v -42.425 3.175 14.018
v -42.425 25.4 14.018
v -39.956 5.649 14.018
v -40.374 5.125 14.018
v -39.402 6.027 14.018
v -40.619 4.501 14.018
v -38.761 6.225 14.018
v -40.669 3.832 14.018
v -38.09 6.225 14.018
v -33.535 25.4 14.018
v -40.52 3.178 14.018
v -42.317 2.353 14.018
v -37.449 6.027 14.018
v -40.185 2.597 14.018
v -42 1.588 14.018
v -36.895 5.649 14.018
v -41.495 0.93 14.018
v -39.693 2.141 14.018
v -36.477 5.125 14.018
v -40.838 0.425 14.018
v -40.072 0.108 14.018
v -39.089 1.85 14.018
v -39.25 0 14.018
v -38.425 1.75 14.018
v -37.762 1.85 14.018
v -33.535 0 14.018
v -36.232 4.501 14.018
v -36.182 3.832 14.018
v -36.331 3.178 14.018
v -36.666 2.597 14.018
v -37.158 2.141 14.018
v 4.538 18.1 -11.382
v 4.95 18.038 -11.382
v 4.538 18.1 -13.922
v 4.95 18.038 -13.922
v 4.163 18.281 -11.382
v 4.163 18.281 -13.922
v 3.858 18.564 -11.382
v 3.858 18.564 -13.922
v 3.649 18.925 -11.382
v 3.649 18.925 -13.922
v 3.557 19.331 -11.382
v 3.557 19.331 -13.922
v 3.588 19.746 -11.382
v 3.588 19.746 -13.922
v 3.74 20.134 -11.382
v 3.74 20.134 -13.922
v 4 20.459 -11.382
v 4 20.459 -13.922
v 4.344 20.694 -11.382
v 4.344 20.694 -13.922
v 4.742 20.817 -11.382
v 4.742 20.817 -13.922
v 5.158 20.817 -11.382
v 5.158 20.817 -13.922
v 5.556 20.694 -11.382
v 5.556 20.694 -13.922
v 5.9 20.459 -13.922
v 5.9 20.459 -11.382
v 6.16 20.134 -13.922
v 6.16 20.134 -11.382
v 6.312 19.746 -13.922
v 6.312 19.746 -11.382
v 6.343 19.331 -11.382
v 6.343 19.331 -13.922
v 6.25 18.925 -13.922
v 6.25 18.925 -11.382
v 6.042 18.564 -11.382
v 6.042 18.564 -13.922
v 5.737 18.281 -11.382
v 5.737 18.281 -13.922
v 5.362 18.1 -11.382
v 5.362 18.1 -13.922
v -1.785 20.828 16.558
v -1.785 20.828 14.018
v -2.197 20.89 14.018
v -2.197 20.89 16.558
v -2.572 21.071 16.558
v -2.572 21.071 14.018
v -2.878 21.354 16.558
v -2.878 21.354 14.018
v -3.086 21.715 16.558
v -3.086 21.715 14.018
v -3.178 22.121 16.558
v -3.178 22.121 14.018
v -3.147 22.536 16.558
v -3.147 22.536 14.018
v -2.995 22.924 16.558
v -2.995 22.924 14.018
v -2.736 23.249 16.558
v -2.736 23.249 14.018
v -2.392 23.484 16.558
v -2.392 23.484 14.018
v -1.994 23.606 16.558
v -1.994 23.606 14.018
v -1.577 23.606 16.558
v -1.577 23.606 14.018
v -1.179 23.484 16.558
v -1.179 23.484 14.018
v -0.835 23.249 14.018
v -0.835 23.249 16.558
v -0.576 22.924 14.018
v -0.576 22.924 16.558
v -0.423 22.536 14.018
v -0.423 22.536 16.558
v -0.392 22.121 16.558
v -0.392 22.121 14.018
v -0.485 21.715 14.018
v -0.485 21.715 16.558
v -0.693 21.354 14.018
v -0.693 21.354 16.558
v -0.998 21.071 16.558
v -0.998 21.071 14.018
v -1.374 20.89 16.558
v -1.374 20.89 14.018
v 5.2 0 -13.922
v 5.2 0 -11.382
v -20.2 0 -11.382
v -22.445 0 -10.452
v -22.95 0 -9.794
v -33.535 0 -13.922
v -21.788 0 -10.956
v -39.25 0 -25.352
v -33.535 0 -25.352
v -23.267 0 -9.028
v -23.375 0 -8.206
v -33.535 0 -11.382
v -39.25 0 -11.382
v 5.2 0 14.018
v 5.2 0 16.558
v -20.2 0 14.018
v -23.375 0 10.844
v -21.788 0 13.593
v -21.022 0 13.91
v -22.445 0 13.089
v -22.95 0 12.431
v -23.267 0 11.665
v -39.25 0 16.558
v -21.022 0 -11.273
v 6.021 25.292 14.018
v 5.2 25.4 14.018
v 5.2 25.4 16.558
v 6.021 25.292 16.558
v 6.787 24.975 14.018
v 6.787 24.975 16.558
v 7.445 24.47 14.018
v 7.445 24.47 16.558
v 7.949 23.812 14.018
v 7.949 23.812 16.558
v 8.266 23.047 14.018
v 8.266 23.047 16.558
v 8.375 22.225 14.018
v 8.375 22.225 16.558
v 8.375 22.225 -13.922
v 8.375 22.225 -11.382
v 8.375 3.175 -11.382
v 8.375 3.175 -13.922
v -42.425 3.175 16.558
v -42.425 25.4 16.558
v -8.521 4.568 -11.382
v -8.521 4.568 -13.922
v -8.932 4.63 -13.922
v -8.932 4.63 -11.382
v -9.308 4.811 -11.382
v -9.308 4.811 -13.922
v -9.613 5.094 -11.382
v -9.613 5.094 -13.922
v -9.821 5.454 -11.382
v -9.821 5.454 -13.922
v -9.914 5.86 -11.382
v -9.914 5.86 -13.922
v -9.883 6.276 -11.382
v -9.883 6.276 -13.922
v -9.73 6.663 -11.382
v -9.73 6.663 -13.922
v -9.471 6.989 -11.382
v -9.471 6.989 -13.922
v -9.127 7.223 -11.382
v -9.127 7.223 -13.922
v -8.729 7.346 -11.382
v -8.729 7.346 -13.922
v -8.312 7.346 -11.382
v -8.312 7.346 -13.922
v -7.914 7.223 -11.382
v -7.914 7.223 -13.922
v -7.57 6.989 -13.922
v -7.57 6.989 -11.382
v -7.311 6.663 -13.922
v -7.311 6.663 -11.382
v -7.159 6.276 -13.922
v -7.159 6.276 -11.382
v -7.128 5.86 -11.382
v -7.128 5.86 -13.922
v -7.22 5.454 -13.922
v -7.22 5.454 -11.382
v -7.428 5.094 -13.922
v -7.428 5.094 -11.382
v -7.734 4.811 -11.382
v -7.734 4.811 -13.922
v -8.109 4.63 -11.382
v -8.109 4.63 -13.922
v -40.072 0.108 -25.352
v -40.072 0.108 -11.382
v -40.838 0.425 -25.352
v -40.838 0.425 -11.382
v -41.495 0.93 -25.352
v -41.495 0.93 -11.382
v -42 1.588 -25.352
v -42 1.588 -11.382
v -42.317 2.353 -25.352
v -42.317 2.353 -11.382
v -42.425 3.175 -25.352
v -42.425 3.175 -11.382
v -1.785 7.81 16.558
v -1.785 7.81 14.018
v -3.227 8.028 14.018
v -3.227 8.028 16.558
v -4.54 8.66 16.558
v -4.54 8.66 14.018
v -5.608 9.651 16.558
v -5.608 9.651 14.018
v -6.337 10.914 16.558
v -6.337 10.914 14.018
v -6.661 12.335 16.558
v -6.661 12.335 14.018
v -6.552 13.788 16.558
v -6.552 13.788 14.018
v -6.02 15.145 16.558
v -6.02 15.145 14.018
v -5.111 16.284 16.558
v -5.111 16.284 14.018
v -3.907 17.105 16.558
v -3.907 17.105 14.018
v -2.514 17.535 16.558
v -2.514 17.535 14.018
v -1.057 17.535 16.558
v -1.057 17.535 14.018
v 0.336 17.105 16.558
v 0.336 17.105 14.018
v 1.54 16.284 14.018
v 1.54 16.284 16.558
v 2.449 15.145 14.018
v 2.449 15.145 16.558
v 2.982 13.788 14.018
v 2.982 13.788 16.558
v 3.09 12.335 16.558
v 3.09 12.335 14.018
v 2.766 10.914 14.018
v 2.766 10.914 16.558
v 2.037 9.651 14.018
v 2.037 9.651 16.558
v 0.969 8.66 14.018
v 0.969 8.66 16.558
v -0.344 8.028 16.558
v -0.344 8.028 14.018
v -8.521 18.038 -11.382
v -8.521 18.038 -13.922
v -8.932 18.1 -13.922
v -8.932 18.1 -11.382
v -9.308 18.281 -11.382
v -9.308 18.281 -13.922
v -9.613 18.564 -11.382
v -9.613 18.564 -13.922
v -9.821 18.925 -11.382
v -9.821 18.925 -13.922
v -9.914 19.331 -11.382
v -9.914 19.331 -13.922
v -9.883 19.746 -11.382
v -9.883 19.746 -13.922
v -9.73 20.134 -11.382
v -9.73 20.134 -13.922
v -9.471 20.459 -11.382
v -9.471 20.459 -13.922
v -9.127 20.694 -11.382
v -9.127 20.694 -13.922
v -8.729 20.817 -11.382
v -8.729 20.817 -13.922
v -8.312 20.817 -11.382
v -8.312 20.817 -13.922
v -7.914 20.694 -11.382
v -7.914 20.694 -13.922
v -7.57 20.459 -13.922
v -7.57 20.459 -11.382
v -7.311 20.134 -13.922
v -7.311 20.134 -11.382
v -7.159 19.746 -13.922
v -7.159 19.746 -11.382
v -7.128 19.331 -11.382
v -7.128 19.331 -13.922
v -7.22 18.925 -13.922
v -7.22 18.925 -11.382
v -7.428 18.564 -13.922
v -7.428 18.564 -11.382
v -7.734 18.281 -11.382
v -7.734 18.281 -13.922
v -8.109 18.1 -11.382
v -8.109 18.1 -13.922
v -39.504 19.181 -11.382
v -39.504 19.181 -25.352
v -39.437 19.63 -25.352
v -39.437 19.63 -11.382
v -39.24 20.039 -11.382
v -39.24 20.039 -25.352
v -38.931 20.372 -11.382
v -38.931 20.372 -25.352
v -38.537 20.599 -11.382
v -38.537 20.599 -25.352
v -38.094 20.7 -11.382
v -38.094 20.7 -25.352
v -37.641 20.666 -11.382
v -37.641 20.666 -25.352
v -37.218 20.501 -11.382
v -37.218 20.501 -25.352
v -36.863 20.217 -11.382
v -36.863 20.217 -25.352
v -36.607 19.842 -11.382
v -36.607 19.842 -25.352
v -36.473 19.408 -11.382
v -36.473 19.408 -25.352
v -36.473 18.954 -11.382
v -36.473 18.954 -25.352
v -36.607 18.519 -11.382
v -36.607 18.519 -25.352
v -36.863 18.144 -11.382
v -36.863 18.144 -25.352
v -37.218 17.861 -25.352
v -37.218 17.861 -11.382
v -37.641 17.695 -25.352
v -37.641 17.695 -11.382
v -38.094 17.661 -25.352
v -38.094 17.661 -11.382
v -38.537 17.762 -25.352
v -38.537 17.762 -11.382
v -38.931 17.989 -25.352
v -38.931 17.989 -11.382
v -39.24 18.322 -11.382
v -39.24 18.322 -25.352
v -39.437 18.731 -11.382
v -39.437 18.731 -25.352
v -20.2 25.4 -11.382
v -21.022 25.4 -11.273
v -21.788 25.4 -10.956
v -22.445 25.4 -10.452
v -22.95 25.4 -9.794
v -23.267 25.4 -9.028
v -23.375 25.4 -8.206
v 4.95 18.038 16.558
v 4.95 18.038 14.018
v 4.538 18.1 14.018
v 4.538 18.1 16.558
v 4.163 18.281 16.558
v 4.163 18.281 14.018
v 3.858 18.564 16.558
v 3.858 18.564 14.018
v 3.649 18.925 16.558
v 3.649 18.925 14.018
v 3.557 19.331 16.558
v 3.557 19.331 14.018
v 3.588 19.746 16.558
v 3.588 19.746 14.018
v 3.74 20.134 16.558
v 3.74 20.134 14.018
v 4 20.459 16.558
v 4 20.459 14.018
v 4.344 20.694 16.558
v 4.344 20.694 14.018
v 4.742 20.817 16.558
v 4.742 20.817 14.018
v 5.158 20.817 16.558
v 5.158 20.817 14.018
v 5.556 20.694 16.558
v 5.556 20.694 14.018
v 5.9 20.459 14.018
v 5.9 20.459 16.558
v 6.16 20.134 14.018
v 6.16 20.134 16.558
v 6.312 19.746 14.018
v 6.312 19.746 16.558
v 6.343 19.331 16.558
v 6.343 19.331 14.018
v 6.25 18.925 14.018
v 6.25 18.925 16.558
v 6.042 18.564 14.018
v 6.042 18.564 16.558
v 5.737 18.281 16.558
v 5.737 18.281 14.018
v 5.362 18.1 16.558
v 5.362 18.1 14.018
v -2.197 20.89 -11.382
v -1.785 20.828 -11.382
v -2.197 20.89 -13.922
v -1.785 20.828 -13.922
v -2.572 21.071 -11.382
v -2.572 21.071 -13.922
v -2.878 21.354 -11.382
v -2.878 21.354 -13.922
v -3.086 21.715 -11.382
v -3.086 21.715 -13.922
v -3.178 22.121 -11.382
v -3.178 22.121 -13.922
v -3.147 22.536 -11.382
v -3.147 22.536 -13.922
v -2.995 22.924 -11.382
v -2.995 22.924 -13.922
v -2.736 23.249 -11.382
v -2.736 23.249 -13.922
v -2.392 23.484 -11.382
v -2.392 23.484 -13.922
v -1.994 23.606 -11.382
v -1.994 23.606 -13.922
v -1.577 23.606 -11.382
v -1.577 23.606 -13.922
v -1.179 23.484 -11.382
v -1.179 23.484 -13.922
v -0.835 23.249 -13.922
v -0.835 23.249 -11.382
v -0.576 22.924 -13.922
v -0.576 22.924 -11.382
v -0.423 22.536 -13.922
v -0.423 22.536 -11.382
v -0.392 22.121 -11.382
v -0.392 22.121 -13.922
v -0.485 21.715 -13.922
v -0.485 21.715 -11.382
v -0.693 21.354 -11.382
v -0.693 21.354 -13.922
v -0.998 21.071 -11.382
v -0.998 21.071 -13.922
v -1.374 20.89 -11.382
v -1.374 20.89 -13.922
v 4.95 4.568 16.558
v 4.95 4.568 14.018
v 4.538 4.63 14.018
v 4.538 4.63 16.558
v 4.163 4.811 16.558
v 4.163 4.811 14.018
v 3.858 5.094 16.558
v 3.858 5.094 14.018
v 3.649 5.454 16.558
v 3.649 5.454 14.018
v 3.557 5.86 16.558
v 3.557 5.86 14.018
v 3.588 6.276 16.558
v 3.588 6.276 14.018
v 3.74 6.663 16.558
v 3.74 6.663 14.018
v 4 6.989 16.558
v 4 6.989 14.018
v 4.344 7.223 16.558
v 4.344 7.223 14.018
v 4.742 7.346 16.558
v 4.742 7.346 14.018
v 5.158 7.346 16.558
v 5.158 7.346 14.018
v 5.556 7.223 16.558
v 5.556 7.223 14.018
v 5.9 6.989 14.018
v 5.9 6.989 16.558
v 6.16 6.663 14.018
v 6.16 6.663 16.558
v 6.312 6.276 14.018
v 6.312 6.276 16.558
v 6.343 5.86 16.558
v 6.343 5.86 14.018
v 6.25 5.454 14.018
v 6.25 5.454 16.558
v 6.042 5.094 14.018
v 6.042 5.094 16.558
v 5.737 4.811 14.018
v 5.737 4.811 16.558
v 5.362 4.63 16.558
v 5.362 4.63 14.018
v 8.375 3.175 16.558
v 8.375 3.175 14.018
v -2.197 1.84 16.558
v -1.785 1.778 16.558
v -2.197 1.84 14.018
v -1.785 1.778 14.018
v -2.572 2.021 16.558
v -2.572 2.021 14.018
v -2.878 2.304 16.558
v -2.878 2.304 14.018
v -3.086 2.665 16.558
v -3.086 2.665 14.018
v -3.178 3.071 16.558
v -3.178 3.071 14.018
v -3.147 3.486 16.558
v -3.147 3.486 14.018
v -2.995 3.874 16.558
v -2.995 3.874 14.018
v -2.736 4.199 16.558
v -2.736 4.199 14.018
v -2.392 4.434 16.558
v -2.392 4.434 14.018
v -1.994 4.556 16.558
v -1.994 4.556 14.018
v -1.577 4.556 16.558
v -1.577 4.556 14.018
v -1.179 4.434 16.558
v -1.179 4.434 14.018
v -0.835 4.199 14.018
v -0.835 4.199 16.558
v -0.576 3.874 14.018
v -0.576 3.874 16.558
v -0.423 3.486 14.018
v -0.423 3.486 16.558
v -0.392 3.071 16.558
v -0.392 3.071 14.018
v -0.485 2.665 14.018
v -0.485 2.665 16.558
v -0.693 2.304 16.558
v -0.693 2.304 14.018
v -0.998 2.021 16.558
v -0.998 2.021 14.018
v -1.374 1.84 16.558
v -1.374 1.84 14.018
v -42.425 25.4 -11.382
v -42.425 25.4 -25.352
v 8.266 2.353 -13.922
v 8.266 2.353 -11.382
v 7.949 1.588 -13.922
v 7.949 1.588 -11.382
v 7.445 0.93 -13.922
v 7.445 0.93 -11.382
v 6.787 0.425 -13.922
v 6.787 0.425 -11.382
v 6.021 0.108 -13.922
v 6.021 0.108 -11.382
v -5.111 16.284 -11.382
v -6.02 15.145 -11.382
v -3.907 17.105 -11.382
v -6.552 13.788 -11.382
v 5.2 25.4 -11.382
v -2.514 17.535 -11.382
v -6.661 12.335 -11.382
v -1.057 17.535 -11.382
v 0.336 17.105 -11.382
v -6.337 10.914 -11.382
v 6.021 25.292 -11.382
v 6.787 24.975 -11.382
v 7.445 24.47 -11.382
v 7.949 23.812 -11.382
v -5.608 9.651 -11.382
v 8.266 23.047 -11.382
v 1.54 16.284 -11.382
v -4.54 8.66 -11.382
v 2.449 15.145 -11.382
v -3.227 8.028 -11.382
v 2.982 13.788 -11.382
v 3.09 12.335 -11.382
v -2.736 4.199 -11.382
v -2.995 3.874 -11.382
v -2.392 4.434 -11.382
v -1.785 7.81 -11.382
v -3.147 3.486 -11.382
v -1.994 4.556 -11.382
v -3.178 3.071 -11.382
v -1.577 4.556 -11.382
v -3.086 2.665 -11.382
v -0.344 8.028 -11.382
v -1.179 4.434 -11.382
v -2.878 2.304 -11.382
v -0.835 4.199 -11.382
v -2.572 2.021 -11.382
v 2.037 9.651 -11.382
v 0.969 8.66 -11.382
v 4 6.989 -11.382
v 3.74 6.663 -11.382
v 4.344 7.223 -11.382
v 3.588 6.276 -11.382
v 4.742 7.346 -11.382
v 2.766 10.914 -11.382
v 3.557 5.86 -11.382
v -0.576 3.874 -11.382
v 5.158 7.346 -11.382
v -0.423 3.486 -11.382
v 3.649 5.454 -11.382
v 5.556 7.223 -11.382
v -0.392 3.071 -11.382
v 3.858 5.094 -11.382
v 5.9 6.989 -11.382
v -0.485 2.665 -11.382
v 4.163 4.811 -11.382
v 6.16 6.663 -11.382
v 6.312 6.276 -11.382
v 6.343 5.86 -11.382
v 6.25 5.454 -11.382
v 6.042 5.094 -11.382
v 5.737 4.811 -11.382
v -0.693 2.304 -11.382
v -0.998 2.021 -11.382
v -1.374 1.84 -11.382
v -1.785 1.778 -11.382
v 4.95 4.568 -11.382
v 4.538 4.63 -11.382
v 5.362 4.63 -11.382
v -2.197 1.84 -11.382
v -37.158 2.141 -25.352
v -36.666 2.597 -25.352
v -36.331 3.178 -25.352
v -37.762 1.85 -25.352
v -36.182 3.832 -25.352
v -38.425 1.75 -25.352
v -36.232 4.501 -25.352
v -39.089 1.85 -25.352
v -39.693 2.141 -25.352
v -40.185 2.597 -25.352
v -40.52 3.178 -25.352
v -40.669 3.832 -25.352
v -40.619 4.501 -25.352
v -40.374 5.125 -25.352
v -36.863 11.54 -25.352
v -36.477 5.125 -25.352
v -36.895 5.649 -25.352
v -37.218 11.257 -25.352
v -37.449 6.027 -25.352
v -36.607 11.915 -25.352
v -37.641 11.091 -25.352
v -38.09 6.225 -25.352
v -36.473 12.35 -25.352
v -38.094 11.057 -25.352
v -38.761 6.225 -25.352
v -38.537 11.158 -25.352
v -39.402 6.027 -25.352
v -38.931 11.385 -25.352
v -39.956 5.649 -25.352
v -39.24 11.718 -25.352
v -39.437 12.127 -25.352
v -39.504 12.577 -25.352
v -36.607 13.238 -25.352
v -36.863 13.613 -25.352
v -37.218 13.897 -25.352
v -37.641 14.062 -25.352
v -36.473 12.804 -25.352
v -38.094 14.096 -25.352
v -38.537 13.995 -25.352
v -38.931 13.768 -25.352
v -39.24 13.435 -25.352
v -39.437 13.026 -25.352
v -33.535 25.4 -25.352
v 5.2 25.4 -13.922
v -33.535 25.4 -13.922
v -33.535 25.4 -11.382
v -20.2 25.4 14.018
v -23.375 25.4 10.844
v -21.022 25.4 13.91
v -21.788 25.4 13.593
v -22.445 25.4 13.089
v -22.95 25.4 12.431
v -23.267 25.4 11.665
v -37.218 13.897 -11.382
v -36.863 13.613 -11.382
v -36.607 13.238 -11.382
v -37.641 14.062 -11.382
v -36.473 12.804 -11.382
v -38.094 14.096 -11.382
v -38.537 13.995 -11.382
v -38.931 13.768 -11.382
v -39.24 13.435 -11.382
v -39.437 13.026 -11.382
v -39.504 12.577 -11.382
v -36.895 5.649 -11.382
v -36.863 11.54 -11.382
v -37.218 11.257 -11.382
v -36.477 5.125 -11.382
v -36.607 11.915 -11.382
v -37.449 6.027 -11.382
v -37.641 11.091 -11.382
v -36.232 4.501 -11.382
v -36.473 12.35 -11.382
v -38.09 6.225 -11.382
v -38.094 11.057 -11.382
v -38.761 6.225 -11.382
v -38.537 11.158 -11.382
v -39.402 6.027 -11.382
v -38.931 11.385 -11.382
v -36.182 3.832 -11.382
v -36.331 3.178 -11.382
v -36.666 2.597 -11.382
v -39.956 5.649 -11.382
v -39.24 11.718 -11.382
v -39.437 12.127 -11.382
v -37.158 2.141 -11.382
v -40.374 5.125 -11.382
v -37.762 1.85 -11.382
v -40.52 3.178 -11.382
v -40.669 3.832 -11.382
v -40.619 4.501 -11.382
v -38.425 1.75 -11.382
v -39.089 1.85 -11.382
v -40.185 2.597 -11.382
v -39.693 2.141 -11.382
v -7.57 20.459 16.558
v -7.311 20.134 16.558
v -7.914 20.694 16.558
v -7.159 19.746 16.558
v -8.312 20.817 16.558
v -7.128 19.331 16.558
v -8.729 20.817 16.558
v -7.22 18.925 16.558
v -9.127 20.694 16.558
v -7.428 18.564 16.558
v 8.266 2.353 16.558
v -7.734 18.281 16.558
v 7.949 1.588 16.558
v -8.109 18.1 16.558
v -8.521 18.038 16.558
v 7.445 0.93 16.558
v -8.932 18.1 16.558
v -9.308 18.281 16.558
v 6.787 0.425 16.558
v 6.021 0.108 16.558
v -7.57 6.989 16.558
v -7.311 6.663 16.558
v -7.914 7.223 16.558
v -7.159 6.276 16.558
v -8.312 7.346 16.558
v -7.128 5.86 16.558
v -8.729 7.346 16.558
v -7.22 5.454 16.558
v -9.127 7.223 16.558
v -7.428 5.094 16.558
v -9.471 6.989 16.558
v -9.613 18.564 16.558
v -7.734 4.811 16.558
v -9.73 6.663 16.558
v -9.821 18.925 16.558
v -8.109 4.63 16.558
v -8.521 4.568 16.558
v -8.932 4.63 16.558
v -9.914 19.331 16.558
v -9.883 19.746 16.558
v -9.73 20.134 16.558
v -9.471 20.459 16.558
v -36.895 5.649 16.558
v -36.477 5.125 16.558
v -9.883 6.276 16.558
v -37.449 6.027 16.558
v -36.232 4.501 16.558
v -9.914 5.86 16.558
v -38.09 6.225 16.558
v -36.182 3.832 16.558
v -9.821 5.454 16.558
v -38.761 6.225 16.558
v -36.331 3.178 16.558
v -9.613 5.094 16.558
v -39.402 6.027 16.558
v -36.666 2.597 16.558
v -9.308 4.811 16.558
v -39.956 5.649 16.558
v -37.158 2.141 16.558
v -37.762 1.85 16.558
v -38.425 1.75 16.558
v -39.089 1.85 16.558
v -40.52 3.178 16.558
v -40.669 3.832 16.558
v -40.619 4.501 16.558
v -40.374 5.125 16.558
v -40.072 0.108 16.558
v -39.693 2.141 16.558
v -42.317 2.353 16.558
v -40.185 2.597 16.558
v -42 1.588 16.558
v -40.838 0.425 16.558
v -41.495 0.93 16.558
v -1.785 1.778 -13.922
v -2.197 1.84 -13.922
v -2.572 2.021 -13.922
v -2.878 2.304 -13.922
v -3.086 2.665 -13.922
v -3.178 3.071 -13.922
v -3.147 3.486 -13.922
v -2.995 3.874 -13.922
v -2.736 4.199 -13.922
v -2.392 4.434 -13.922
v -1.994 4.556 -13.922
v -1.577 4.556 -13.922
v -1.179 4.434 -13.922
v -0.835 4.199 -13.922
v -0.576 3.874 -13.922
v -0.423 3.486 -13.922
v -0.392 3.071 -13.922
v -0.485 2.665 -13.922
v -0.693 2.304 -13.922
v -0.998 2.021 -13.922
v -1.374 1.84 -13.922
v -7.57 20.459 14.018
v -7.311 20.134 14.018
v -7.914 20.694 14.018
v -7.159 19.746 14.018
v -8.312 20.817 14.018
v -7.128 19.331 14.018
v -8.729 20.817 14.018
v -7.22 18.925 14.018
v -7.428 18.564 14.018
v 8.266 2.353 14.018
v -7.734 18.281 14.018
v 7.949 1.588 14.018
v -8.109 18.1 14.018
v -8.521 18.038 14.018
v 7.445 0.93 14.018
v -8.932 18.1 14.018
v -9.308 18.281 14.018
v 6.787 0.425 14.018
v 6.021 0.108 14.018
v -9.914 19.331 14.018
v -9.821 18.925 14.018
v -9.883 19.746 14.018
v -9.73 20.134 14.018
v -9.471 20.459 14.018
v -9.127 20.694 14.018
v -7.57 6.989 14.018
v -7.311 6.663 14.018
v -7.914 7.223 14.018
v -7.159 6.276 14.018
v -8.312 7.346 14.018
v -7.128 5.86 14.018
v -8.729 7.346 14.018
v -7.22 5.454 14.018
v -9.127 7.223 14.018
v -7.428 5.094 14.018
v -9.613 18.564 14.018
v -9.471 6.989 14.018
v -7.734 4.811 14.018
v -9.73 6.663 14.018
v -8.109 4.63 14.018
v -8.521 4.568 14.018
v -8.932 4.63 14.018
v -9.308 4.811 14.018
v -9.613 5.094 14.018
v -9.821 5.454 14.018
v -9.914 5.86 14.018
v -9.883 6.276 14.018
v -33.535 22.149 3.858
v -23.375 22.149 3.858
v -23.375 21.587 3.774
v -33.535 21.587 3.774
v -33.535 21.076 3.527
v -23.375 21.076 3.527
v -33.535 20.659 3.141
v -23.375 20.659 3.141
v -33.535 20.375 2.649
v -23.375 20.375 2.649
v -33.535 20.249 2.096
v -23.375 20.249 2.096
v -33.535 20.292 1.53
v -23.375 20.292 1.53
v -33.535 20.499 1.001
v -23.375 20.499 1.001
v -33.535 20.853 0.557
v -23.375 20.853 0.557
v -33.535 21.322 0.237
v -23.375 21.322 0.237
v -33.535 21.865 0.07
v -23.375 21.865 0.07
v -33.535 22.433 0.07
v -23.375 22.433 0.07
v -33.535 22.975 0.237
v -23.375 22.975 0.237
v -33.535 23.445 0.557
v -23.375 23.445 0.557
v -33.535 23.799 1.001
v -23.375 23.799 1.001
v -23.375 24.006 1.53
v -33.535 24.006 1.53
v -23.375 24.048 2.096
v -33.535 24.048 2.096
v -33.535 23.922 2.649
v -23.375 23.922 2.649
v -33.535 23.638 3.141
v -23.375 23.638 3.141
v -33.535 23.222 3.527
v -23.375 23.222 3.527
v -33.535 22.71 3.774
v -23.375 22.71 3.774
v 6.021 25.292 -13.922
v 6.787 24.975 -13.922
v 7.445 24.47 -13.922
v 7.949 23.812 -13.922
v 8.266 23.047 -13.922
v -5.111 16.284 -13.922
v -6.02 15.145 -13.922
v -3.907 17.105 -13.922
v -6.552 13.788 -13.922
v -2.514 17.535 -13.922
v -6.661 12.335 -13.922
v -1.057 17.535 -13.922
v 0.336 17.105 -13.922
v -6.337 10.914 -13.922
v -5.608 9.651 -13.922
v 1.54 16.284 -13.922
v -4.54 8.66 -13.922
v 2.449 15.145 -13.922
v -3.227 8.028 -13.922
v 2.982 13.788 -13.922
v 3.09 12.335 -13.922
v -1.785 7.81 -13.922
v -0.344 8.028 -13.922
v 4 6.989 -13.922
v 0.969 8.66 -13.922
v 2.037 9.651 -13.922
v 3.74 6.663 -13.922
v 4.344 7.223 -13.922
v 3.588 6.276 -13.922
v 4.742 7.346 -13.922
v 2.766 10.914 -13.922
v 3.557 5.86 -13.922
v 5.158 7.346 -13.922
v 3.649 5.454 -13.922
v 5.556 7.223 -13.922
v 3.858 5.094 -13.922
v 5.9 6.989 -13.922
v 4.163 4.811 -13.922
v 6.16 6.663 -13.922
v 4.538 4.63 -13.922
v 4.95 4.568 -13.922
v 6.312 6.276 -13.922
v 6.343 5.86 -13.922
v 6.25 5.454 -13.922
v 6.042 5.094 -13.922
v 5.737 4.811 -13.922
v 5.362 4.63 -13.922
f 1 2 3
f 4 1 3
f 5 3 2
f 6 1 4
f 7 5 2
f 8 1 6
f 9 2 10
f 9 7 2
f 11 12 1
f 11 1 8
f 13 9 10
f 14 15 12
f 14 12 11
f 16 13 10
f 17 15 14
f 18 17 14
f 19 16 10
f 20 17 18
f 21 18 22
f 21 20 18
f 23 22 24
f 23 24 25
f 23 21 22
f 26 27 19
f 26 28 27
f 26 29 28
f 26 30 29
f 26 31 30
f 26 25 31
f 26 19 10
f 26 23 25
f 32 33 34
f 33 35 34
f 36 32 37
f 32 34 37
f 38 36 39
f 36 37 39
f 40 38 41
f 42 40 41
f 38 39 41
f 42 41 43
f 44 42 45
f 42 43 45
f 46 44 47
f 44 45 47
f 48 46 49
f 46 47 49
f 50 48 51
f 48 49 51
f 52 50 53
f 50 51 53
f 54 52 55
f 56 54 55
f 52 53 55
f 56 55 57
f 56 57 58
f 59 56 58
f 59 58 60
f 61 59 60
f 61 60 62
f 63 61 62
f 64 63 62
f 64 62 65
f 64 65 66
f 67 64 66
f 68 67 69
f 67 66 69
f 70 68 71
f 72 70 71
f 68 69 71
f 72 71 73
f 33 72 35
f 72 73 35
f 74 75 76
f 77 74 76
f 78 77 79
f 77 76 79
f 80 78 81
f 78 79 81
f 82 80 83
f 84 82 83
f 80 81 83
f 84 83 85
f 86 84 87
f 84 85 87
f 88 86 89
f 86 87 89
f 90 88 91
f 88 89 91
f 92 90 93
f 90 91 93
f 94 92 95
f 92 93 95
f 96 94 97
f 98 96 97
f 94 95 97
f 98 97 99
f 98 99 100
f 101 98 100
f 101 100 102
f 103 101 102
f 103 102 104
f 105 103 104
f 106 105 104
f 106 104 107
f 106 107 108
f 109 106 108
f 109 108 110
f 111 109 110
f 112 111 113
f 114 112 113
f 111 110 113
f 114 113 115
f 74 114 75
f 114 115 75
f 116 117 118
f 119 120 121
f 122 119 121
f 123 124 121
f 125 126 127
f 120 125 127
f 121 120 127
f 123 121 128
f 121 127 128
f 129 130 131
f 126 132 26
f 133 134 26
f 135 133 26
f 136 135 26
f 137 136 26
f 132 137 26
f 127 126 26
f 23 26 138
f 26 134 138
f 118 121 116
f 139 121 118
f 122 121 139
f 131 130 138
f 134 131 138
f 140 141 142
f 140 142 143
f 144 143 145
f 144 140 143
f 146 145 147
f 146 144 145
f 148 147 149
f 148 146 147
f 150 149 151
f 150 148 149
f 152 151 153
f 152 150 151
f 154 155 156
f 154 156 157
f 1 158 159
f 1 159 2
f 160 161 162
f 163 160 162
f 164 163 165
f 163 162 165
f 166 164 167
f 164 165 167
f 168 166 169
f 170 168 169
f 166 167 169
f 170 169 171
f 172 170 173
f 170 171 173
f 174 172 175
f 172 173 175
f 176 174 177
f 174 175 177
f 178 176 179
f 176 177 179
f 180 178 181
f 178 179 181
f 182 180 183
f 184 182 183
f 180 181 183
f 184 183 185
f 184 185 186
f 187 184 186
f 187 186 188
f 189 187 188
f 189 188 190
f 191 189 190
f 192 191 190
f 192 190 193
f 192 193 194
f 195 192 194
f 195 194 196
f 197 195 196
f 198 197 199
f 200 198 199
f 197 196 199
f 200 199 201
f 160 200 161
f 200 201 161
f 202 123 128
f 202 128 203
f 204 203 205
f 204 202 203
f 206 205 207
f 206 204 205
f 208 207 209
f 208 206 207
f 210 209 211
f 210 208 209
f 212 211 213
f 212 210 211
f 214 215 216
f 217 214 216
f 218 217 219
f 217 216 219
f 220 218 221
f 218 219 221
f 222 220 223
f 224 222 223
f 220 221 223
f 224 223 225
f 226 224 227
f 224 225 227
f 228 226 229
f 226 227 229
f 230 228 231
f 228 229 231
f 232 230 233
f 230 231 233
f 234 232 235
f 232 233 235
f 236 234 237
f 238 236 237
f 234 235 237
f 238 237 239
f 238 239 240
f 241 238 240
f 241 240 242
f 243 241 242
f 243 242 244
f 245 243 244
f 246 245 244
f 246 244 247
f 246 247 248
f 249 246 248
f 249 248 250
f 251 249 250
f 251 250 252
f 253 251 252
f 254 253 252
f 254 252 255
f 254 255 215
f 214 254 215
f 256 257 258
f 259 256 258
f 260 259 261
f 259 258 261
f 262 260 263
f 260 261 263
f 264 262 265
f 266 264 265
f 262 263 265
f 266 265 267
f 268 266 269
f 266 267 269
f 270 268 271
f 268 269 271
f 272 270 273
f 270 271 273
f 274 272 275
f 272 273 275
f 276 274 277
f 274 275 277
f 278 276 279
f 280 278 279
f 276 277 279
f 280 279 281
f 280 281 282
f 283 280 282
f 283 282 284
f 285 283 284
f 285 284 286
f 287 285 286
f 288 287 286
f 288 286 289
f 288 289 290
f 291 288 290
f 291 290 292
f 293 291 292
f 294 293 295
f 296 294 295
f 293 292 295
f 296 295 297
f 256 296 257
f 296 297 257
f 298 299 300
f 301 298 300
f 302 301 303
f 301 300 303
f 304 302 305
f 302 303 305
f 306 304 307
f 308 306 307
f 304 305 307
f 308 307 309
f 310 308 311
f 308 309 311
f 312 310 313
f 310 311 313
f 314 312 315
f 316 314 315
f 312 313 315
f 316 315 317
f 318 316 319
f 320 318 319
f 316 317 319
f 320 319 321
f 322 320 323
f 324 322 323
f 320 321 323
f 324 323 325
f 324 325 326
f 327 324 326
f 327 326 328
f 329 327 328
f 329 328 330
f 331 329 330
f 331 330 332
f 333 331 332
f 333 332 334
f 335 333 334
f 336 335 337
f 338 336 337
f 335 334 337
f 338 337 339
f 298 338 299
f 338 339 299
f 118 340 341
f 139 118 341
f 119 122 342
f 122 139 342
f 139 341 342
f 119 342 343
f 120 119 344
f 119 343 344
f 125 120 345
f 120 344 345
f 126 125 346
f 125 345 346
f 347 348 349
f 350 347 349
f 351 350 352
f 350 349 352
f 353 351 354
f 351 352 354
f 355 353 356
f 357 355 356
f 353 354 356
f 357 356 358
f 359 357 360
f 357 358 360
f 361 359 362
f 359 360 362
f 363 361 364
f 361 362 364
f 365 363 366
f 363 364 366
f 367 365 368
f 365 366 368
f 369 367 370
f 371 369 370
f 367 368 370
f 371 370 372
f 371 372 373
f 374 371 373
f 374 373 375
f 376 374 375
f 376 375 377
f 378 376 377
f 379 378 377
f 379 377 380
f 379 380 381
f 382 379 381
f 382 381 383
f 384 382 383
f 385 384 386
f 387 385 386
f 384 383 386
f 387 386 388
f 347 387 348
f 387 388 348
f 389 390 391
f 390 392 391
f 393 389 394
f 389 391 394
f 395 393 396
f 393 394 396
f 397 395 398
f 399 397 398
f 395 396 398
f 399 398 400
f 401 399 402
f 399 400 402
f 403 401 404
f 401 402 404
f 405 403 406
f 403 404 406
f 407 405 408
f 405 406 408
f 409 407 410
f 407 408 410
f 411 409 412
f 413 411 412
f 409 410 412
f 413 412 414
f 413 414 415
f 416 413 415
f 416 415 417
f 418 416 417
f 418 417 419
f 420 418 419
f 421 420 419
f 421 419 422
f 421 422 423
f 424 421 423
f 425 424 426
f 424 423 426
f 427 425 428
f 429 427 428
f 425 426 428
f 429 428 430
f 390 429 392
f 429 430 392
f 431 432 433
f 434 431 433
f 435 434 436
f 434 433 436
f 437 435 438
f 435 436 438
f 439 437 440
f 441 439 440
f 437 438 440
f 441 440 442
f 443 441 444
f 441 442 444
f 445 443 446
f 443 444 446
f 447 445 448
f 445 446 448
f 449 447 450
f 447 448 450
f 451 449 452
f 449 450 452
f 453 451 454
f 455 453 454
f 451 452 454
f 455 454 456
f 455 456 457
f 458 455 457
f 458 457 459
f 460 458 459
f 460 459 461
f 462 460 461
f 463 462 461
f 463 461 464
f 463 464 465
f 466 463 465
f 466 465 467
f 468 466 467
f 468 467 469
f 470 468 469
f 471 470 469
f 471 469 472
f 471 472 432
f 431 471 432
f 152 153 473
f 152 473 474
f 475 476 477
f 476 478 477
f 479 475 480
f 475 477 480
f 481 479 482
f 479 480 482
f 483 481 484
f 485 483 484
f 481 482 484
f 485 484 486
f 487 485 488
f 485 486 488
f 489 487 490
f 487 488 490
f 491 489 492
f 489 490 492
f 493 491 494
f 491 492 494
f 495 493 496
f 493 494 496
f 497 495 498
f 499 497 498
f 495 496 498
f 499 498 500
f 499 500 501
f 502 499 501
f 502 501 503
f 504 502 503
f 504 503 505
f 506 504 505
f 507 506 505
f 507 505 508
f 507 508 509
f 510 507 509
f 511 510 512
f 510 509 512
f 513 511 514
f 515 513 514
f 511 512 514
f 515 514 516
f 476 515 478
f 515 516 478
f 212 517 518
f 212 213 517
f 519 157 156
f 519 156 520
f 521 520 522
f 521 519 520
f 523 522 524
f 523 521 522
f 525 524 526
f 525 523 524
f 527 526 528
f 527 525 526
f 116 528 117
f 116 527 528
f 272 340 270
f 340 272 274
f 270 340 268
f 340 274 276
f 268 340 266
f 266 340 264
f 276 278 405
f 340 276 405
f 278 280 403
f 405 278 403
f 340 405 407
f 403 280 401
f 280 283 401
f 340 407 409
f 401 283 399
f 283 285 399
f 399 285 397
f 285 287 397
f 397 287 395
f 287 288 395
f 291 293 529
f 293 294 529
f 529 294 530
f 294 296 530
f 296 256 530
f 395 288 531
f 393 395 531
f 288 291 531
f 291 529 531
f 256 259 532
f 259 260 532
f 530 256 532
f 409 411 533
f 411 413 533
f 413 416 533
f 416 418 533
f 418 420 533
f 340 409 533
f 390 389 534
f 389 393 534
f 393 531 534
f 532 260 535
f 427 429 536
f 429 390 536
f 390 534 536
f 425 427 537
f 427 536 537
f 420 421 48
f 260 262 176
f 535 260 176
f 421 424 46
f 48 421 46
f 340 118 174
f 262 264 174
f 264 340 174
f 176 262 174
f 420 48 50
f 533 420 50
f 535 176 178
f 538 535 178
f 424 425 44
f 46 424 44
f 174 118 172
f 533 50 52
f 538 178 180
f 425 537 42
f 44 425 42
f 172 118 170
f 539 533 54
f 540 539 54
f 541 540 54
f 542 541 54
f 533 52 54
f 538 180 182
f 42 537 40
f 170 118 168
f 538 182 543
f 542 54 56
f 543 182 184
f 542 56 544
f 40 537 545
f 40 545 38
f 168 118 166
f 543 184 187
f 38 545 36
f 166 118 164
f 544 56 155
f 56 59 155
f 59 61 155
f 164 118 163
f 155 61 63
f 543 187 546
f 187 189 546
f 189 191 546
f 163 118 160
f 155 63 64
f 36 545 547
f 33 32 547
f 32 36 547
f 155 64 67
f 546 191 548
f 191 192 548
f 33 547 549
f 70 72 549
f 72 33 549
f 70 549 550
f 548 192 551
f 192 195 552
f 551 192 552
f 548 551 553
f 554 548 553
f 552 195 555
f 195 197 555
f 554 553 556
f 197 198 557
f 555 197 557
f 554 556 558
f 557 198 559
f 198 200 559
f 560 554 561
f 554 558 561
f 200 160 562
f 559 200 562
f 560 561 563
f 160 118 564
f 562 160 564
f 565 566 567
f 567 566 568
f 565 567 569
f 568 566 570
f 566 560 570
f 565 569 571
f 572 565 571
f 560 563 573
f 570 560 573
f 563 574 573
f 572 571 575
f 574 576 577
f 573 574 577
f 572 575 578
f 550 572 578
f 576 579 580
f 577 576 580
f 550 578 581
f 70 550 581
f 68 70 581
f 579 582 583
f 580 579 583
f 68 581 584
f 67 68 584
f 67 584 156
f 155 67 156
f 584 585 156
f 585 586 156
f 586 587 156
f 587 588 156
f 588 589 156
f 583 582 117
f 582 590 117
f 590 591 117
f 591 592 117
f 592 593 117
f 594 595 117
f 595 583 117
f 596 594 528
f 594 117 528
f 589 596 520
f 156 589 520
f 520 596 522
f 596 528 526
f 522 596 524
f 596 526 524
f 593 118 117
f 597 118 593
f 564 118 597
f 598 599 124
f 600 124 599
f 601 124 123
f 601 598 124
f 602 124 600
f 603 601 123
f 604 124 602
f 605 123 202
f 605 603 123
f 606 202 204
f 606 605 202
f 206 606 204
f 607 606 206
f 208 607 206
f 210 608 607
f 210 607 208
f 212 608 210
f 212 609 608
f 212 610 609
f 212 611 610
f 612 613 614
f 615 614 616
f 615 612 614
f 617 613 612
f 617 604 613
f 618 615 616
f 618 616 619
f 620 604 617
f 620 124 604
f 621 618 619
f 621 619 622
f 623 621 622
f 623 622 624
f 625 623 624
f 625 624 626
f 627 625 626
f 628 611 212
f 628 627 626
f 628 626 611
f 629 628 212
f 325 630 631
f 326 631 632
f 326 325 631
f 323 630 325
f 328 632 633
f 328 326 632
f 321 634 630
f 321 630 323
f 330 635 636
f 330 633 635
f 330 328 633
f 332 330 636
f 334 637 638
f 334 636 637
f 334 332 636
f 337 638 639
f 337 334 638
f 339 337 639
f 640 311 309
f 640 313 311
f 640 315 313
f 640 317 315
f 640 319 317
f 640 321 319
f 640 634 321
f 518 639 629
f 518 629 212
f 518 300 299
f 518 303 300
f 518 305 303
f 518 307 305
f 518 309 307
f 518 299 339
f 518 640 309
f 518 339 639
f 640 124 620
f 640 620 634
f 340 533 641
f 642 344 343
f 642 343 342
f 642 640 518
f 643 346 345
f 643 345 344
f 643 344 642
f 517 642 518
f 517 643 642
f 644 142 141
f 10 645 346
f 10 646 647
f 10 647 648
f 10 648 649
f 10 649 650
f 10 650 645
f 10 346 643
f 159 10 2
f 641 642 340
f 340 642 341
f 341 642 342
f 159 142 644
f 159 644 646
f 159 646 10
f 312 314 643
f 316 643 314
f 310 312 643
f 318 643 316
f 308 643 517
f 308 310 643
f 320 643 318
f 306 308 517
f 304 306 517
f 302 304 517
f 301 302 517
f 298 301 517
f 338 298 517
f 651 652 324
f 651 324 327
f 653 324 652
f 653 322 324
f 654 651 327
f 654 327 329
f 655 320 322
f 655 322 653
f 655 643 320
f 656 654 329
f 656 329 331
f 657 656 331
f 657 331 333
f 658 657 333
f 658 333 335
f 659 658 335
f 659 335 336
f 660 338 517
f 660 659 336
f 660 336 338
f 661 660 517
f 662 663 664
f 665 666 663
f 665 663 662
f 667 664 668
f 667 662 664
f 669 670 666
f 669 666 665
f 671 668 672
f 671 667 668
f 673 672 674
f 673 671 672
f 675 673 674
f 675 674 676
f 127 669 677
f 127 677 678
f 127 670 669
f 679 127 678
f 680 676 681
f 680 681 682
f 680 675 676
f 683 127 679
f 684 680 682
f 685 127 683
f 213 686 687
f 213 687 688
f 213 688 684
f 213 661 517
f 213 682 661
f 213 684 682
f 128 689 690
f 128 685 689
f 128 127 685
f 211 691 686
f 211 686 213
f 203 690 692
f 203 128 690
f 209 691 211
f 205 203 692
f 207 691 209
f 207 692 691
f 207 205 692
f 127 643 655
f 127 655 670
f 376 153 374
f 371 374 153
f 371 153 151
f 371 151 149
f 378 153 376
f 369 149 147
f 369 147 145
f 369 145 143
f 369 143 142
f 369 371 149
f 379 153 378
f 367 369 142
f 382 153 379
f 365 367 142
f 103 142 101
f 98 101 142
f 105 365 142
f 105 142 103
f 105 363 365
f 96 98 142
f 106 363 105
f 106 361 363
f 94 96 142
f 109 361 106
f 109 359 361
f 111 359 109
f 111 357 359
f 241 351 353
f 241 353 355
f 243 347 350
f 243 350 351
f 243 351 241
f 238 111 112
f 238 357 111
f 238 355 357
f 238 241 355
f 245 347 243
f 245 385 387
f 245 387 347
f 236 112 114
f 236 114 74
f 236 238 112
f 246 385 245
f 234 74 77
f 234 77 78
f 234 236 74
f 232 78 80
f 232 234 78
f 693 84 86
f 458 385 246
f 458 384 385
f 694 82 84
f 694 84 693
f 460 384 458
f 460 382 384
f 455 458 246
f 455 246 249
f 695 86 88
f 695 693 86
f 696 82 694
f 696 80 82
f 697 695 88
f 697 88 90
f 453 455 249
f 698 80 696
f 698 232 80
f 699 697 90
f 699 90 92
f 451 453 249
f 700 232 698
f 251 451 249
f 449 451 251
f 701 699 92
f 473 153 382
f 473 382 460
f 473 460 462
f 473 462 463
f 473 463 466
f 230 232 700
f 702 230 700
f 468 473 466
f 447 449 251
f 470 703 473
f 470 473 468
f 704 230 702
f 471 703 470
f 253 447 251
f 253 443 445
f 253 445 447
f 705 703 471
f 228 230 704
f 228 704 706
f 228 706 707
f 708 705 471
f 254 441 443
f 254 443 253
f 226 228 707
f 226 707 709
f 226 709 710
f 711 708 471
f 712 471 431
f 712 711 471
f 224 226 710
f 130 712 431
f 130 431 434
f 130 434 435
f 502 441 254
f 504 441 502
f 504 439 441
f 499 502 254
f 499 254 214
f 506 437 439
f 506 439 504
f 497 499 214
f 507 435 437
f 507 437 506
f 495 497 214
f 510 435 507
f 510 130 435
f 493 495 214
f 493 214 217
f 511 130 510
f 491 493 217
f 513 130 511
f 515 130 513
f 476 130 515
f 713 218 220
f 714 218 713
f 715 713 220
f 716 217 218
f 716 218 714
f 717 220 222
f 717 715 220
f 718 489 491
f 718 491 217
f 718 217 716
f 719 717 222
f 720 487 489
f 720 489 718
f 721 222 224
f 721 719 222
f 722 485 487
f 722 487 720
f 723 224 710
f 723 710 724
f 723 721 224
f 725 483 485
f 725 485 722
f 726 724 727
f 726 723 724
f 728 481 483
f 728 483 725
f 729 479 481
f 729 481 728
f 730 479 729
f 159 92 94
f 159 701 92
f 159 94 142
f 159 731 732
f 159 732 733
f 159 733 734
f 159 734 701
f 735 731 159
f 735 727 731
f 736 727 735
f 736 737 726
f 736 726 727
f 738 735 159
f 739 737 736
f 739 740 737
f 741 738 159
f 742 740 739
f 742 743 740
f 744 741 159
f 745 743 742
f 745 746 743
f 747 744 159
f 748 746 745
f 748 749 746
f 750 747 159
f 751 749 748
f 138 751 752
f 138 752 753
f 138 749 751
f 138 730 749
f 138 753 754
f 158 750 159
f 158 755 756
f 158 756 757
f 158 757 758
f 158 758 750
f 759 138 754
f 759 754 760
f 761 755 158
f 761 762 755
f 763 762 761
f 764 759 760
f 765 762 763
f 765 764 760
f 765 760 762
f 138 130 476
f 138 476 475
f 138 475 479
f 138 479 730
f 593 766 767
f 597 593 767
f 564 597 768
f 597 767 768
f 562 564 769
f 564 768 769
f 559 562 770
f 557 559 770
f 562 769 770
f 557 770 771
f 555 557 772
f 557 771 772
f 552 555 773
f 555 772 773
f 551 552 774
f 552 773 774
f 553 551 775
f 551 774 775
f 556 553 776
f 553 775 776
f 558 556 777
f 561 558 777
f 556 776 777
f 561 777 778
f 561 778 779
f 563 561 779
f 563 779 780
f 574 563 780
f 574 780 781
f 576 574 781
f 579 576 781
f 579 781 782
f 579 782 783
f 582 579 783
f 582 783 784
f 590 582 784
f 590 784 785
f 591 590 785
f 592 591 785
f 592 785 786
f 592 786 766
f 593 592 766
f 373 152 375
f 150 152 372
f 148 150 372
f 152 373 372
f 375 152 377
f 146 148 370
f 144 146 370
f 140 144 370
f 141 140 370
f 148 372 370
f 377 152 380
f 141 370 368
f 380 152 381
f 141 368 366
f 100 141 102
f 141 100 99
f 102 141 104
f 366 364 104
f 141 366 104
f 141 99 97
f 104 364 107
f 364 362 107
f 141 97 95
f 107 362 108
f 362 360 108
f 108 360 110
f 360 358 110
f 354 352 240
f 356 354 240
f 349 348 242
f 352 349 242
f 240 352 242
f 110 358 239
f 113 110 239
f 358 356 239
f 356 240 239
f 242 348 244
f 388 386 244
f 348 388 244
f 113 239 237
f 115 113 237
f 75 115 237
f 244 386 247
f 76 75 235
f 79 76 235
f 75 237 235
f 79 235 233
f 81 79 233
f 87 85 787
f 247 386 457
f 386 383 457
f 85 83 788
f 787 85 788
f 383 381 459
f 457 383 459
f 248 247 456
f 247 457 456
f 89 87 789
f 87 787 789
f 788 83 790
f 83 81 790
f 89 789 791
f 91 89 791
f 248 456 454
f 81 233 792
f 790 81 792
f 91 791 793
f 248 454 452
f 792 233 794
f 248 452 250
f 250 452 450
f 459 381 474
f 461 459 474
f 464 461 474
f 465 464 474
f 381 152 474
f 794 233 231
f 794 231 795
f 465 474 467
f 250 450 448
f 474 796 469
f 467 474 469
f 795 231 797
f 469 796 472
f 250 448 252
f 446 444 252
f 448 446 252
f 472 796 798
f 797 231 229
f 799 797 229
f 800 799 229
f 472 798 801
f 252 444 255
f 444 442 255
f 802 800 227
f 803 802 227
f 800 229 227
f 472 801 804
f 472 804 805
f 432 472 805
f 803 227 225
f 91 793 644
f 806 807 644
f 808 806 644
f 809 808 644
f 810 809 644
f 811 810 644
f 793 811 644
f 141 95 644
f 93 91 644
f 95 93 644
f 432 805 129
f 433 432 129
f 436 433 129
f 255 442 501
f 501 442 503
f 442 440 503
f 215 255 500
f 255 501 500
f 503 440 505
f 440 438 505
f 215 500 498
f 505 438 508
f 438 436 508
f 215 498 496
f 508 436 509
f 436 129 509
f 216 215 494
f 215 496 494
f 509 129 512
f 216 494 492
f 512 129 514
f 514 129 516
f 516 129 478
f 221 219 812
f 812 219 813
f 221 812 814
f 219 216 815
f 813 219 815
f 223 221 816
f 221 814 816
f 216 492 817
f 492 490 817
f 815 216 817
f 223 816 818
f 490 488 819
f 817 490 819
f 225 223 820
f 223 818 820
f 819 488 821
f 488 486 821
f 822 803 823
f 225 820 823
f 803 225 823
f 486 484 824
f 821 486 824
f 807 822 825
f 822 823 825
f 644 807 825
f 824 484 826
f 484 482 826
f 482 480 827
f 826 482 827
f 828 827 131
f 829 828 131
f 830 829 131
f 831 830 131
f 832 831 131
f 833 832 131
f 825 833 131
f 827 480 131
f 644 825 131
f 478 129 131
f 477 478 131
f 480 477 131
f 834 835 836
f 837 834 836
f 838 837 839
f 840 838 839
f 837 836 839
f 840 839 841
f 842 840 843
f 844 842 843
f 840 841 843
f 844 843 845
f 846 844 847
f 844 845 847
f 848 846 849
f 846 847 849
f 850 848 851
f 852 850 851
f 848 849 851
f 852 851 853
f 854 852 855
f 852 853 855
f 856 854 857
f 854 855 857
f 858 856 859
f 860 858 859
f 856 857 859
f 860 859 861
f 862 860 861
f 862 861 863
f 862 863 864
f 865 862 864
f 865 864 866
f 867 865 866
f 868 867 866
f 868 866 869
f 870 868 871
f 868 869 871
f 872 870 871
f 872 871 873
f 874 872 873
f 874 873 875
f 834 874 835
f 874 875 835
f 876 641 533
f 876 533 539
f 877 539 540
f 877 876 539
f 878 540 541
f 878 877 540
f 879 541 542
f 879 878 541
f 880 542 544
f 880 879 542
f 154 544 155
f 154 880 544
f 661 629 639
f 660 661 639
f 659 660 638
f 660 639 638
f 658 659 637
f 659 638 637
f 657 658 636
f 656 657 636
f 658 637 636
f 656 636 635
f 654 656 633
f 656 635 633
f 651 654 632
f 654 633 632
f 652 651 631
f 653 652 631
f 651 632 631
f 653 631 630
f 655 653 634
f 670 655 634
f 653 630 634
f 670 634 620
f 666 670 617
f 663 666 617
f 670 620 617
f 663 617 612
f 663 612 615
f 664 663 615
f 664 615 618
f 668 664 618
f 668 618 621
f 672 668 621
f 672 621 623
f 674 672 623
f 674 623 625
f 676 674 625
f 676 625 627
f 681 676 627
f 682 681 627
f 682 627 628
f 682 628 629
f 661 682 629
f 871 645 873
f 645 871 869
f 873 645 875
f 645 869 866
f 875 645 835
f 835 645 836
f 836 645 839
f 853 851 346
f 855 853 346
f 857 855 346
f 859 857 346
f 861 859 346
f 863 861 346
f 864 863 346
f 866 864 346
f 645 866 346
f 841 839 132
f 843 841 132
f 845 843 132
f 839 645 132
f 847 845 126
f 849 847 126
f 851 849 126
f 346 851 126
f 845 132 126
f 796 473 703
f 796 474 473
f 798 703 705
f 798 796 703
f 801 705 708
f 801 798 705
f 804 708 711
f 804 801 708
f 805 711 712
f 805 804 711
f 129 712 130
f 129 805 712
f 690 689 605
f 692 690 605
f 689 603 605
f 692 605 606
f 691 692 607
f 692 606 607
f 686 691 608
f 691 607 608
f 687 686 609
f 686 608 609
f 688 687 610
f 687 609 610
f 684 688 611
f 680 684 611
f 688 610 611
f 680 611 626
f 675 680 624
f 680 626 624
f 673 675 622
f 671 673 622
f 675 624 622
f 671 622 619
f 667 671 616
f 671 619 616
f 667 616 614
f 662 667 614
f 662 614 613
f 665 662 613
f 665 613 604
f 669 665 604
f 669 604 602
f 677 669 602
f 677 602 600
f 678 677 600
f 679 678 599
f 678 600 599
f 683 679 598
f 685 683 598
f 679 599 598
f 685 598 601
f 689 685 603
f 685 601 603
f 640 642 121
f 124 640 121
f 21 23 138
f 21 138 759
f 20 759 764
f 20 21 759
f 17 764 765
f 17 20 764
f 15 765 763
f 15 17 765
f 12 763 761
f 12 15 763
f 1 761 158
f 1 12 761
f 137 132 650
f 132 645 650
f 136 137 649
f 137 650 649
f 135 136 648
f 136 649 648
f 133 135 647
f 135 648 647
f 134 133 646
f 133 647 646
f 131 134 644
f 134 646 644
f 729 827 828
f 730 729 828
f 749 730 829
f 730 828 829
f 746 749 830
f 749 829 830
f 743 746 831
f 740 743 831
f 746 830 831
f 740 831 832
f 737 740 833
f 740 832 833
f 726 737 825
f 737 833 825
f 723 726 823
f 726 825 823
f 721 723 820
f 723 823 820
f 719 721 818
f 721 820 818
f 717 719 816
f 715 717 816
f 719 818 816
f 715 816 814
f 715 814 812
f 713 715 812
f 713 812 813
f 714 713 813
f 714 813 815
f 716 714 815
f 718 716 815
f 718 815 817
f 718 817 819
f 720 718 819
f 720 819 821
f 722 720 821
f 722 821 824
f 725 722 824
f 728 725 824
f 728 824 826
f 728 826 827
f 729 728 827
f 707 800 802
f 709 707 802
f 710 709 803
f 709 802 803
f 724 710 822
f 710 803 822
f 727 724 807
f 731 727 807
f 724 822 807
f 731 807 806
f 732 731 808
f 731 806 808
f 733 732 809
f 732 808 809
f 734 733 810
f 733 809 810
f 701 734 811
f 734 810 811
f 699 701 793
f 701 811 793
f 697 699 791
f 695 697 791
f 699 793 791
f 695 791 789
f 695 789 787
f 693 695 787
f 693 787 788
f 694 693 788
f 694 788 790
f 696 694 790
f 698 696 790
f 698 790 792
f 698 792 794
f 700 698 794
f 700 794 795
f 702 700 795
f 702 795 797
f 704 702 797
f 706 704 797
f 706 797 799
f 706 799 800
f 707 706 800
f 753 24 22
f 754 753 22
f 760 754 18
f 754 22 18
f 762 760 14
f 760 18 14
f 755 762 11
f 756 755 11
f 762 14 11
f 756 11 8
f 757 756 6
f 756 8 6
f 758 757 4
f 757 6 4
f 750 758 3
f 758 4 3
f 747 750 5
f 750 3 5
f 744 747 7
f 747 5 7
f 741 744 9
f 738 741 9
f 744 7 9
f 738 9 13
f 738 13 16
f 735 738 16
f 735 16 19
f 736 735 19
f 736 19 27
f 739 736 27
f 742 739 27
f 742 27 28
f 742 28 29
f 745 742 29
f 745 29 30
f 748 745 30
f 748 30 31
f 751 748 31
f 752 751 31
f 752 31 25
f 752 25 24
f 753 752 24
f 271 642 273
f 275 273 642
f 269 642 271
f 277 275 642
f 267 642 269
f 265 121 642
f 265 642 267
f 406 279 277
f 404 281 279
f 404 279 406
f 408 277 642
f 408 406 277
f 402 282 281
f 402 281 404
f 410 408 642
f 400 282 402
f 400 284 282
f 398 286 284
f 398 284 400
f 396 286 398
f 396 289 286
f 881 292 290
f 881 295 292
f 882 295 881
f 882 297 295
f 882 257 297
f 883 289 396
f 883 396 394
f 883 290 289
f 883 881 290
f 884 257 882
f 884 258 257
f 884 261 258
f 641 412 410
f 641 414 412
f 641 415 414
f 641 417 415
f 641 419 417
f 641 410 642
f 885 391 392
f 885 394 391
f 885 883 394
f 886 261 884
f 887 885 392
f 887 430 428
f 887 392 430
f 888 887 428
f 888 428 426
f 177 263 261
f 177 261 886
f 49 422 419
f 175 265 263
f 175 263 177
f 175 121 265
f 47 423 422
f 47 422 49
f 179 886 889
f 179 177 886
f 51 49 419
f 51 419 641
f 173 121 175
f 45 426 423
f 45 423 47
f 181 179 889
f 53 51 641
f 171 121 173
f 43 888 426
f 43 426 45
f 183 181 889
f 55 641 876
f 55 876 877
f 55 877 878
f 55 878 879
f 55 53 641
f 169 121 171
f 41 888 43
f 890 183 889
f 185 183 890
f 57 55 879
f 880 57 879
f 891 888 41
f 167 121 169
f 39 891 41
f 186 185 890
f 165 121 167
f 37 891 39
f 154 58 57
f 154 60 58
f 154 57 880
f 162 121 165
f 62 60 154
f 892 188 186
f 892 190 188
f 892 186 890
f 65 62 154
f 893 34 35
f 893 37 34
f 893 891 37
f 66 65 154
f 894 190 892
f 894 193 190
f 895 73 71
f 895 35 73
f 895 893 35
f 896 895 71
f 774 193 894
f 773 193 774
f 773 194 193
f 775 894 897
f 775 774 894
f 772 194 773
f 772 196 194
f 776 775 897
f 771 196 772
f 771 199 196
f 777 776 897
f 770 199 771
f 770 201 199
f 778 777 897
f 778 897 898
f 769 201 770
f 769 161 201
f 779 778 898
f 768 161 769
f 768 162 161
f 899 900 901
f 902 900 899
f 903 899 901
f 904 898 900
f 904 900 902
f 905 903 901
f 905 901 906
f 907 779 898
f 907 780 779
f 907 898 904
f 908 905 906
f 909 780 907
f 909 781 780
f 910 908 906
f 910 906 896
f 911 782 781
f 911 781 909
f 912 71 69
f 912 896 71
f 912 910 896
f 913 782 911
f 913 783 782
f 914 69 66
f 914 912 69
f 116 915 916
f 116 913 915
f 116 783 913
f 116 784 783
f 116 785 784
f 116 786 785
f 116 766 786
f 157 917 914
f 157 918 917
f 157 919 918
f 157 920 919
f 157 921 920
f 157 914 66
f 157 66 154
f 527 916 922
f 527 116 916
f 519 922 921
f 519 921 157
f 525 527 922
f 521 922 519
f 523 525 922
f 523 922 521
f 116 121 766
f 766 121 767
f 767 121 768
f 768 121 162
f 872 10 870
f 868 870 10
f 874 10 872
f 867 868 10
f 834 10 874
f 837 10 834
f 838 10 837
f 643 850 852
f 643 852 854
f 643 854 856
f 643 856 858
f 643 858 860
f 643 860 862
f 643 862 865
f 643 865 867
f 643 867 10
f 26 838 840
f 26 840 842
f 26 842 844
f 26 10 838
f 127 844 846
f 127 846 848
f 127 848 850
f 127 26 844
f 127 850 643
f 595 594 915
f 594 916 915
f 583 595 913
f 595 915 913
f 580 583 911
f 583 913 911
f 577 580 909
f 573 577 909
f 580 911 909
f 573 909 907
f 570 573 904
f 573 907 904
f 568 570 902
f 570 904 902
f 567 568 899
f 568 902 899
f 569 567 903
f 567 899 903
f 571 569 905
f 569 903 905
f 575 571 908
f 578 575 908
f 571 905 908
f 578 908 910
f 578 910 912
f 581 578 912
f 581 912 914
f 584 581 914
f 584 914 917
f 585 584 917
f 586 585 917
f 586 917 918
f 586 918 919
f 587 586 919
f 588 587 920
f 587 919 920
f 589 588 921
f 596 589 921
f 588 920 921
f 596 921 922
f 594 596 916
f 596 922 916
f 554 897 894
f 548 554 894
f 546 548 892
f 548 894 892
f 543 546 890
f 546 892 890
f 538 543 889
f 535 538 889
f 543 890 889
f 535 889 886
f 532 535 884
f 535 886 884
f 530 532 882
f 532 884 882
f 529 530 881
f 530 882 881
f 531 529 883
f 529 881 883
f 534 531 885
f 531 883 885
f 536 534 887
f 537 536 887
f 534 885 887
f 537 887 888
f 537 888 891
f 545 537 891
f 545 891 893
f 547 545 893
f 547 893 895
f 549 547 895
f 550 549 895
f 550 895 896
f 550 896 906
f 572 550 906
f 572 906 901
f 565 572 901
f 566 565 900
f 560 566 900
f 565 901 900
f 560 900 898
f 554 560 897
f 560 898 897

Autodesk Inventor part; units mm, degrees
ref_plane "YZ Plane" through (0, 0, 0) normal (1, 0, 0) x (0, 1, 0)
ref_plane "XZ Plane" through (0, 0, 0) normal (0, 1, 0) x (-1, 0, 0)
ref_plane "XY Plane" through (0, 0, 0) normal (0, 0, 1) x (1, 0, 0)
sketch "Sketch1" plane through (0, 0, 0) normal (0, 1, 0) x (-1, 0, 0)
  line L0 (-8.3746, 16.5585) -> (42.4254, 16.5585)
  line L1 (42.4254, 16.5585) -> (42.4254, 14.0185)
  line L2 (42.4254, 14.0185) -> (33.5354, 14.0185)
  line L3 (33.5354, 14.0185) -> (33.5354, -11.3815)
  line L4 (33.5354, -11.3815) -> (42.4254, -11.3815)
  line L5 (42.4254, -11.3815) -> (42.4254, -13.9215)
  line L6 (42.4254, -13.9215) -> (-8.3746, -13.9215)
  line L7 (-8.3746, 16.5585) -> (-8.3746, 14.0185)
  line L8 (-8.3746, 14.0185) -> (23.3754, 14.0185)
  line L9 (23.3754, 14.0185) -> (23.3754, -11.3815)
  line L10 (23.3754, -11.3815) -> (-8.3746, -11.3815)
  line L11 (-8.3746, -11.3815) -> (-8.3746, -13.9215)
  point P0 (0, 0)
  dimension "d0" = 30.48
  dimension "d1" = 2.54
  dimension "d2" = 2.54
  dimension "d4" = 2.54
  dimension "d5" = 2.54
  dimension "d6" = 8.89
  dimension "d7" = 50.8
  dimension "d8" = 31.75
extrude "Extrusion1" add sketch "Sketch1" along normal blind 25.4
sketch "Sketch4" plane through (8.3746, 0, -13.9215) normal (0, 0, -1) x (-1, 0, 0)
  line L0 (50.8, 0) -> (0, 0) projected
  line L1 (50.8, 0) -> (50.8, 25.4) projected
  line L2 (0, 25.4) -> (50.8, 25.4) projected
  line L3 (50.8, 25.4) -> (41.91, 25.4)
  line L4 (41.91, 25.4) -> (41.91, 0)
  line L5 (41.91, 0) -> (50.8, 0)
  line L6 (50.8, 0) -> (50.8, 25.4)
  point P0 (8.3746, 0)
  dimension "d56" = 8.89
extrude "Extrusion3" add sketch "Sketch4" along normal blind 11.43
sketch "Sketch5" plane through (-42.4254, 0, 16.5585) normal (0, 0, 1) x (1, 0, 0)
  line L0 (50.8, 0) -> (50.8, 25.4) projected
  line L1 (50.8, 0) -> (0, 0) projected
  point P0 (40.64, 12.7)
  dimension "d11" = 10.16
  dimension "d12" = 12.7
hole "Hole1" at (-1.7854, 12.7, 16.5585) direction (0, 0, -1) diameter 9.779 end through all
sketch "Sketch6" plane through (-42.4254, 0, 16.5585) normal (0, 0, 1) x (1, 0, 0)
  line L0 (0, 0) -> (0, 25.4) projected
  line L1 (50.8, 0) -> (0, 0) projected
  point P0 (4, 4)
  dimension "d20" = 4
  dimension "d21" = 4
hole "Hole2" at (-38.4254, 4, 16.5585) direction (0, 0, -1) diameter 4.5 end through all
sketch "Sketch2" plane through (-42.4254, 0, 16.5585) normal (0, 0, 1) x (1, 0, 0)
  circle A0 centre (40.64, 12.7) radius 4.8895 projected
  line L0 (40.64, 22.225) -> (40.64, 3.175) construction
  circle A1 centre (40.64, 12.7) radius 4.8895 construction
  line L1 (40.64, 12.7) -> (33.9048, 19.4352) construction
  line L2 (40.64, 12.7) -> (33.9048, 5.9648) construction
  line L3 (40.64, 12.7) -> (47.3752, 5.9648) construction
  line L4 (40.64, 12.7) -> (47.3752, 19.4352) construction
  point P0 (42.4254, 0)
  dimension "d29" = 9.525
  dimension "d30" = 0
  dimension "d33" = 360
  dimension "d60" = 45
  dimension "d63" = 360
hole "Hole3" at (-1.7854, 3.175, 16.5585) at (-1.7854, 22.225, 16.5585) at (-8.5206, 5.9648, 16.5585) at (-8.5206, 19.4352, 16.5585) at (4.9498, 19.4352, 16.5585) at (4.9498, 5.9648, 16.5585) direction (0, 0, -1) diameter 2.794 end through all
fillet "Fillet2" radius 3.175 8 edges at (-42.4254, 0, -18.3665) (-42.4254, 0, 15.2885) (-23.3754, 12.7, 14.0185) (-23.3754, 12.7, -11.3815) (8.3746, 0, -12.6515) (8.3746, 25.4, -12.6515) (8.3746, 25.4, 15.2885) (8.3746, 0, 15.2885)
hole "Hole4" at (-33.5354, 22.1488, 1.9535) direction (1, 0, 0) diameter 3.81 end through all
sketch "Sketch7" plane through (8.3746, 0, -25.3515) normal (0, 0, -1) x (-1, 0, 0)
  circle A0 centre (46.355, 19.1807) radius 1.524
  circle A1 centre (46.355, 12.5767) radius 1.524
  line L0 (50.8, 3.175) -> (50.8, 25.4) construction
  line L1 (41.91, 25.4) -> (41.91, 0) construction
  line L2 (50.8, 25.4) -> (41.91, 25.4) construction
  point P0 (8.3746, 0)
  dimension "d65" = 3.048
  dimension "d66" = 3.048
  dimension "d67" = 6.604
  dimension "d68" = 8.89
  dimension "d69" = 4.445
  dimension "d70" = 4.445
  dimension "d71" = 6.2193
extrude "Extrusion4" cut sketch "Sketch7" against normal up to surface (13.97 mm away)
equation "\"d2\" = d1"
equation "\"d4\" = d1"
equation "\"d5\" = d1"
equation "\"d69\" = 0.5 * d68"
equation "\"d70\" = 0.5 * d68"
properties part number "Odometry_Holder-01"
